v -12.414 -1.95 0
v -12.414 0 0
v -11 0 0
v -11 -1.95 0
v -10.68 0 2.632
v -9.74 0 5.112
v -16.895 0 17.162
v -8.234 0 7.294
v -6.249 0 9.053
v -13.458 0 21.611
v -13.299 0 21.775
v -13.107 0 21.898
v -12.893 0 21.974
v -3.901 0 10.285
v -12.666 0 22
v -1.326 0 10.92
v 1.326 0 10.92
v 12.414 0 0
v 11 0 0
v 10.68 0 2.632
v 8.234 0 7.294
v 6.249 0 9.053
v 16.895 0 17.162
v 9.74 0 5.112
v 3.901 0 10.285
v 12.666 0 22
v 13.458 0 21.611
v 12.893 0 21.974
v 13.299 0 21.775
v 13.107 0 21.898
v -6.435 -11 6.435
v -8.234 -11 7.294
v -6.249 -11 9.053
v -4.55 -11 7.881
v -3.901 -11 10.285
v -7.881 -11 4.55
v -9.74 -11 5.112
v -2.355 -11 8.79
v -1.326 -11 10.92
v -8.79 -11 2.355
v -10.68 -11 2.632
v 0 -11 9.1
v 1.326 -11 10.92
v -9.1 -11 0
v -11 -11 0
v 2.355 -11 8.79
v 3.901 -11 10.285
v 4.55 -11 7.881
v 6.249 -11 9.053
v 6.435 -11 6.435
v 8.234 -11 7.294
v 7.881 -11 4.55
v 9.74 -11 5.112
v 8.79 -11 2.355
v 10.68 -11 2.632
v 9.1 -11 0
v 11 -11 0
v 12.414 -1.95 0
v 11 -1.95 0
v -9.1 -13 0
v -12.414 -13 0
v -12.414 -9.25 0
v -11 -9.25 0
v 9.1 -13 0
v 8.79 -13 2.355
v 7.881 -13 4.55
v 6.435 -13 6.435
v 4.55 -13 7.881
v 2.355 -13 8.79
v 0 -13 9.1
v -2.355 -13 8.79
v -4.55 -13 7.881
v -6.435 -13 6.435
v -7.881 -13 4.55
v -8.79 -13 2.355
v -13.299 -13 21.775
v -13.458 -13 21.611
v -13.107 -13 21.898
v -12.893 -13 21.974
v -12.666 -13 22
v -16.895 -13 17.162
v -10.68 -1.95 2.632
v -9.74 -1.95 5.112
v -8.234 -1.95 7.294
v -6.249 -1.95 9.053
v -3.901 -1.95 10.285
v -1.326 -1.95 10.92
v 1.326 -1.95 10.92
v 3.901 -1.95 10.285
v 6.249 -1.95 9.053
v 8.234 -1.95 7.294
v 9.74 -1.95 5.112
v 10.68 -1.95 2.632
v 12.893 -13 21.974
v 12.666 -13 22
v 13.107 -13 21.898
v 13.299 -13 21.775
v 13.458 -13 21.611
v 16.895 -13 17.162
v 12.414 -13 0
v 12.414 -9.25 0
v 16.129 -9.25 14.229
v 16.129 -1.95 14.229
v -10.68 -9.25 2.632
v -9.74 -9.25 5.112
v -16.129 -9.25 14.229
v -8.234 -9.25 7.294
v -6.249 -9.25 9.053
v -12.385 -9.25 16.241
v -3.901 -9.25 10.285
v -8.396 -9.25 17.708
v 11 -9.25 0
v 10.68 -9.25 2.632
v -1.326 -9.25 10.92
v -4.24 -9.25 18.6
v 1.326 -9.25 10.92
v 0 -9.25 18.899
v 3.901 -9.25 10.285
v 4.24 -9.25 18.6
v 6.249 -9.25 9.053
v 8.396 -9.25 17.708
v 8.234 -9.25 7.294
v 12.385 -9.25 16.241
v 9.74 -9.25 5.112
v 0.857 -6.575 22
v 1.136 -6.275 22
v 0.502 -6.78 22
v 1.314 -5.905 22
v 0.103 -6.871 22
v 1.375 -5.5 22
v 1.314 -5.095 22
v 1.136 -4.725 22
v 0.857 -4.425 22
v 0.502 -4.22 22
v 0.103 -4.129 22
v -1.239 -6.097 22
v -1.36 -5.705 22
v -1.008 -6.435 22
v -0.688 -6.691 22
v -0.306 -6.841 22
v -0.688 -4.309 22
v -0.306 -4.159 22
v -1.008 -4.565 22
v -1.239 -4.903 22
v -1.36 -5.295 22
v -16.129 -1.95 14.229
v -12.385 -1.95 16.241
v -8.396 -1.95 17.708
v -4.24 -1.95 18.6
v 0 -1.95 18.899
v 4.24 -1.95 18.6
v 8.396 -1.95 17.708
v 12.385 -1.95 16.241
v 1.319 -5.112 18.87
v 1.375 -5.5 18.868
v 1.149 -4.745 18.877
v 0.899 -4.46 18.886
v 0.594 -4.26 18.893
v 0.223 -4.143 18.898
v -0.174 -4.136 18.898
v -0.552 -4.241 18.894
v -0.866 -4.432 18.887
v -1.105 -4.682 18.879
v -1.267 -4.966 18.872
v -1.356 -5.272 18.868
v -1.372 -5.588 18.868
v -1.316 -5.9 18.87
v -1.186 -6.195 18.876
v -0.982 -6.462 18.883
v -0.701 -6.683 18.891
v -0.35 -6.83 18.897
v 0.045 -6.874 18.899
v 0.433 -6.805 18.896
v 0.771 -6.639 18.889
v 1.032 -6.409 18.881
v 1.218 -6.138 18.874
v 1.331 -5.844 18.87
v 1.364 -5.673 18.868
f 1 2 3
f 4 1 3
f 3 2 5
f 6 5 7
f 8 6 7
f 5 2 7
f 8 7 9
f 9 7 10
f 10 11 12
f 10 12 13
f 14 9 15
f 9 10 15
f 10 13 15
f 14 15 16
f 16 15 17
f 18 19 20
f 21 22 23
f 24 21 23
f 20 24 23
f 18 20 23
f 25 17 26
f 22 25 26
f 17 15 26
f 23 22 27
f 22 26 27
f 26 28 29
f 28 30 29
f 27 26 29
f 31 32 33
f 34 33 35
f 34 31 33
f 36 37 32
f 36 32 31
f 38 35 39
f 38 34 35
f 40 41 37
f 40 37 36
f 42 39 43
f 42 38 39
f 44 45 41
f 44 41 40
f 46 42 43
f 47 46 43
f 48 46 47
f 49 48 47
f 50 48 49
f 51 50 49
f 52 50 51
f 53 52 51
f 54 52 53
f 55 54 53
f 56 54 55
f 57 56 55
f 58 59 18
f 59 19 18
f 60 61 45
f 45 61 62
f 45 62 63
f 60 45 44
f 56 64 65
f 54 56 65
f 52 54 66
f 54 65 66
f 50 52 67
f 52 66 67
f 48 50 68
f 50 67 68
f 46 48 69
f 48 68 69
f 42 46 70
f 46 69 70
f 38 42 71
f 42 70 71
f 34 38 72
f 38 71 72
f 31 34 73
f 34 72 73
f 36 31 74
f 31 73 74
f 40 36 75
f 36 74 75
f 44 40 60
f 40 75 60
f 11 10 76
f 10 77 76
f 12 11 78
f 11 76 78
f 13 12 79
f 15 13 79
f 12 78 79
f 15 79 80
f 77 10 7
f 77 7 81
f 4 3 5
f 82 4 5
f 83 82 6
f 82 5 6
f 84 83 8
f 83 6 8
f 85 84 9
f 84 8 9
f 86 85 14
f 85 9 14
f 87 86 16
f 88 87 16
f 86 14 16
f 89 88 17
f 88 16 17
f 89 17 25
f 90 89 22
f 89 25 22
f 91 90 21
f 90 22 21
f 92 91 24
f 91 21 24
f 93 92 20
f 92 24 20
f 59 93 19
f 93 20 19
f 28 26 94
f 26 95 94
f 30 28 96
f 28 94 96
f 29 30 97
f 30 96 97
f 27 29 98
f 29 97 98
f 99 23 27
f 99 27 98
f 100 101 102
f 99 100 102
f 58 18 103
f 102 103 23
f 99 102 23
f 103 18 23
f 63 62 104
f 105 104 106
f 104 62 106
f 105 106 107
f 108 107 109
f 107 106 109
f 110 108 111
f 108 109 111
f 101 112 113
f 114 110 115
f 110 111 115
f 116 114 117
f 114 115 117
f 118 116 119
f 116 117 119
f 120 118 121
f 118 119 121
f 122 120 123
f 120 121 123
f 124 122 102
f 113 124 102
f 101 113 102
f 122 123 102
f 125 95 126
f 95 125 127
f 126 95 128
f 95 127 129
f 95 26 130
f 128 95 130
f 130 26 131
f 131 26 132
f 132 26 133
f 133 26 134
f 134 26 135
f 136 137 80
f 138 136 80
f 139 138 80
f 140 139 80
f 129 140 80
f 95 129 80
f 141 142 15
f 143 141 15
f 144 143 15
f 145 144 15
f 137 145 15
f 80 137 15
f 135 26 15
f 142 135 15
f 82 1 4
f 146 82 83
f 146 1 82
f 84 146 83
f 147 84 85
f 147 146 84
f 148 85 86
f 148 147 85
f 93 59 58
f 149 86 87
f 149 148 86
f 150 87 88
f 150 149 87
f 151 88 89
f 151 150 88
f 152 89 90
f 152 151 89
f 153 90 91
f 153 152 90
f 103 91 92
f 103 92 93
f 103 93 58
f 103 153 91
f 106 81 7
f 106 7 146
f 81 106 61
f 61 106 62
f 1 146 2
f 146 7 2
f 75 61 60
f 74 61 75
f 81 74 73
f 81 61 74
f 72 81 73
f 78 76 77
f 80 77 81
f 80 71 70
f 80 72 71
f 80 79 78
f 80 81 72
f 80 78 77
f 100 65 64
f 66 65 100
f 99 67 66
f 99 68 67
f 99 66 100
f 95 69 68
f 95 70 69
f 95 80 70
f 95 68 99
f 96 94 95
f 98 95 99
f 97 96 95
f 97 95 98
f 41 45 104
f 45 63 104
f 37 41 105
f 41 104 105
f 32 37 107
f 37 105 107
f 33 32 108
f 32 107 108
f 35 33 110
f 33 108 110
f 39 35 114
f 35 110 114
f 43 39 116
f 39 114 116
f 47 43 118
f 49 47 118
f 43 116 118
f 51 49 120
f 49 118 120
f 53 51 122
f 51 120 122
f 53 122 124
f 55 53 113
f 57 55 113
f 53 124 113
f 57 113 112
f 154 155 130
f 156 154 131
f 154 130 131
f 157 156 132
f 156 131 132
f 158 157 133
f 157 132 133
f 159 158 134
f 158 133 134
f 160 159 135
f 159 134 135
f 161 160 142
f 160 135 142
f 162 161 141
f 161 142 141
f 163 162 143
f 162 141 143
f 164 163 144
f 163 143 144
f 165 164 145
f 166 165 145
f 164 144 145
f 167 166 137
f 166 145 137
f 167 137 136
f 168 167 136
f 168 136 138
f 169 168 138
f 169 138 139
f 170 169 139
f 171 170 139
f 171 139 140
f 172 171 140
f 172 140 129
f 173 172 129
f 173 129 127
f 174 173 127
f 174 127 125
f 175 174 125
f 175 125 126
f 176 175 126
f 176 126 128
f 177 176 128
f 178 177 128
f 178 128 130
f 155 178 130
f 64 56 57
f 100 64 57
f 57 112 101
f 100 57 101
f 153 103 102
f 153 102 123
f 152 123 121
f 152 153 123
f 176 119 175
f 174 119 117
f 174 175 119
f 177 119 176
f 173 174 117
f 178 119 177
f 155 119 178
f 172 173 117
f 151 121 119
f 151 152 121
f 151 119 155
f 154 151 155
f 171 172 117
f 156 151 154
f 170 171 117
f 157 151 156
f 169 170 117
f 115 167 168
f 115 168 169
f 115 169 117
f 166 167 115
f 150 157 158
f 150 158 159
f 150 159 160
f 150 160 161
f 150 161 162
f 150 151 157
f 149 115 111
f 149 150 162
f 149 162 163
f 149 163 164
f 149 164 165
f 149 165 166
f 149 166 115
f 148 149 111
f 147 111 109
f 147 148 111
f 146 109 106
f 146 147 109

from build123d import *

# Parameters (mm, degrees)
PAD040_DEPTH            = 7.3
BODY031_PLACEMENT_ANGLE = 90
PAD042_DEPTH            = 13
SKETCH139_R             = 11
POCKET086_DEPTH         = 11
SKETCH140_R             = 9.1
POCKET087_DEPTH         = 5
SKETCH141_R             = 1.375
POCKET088_DEPTH         = 5
CHAMFER021_SIZE         = 5
FILLET005_R             = 1


with BuildPart() as cortar_aleros:
    # Sketch132 → Pad040 (new body)
    with BuildSketch(Plane.XY):
        with BuildLine():
            ThreePointArc((30, -7.93752), (0, 18.8989421975), (-30, -7.93752))
            Line((-30, -7.93752), (30, -7.93752))
        make_face()
    extrude(amount=PAD040_DEPTH)


with BuildPart() as cortar_aleros_1:
    # Body031 placement: moved
    add(cortar_aleros.part.moved(Location((0, -1.95, 0))).rotate(Axis((0, -1.95, 0), (1, 0, 0)), BODY031_PLACEMENT_ANGLE))


with BuildPart() as grip_superior:
    # Sketch138 → Pad042 (new body)
    with BuildSketch(Plane.XZ):
        Polygon((-12.413768, 0), (12.413768, 0), (18.157619, 22), (-18.157619, 22), align=None)
    extrude(amount=PAD042_DEPTH)

    # Sketch139 (on Face5 of Pad042) → Pocket086 (cut)
    with BuildSketch(Plane(origin=(0, 0, 0), x_dir=(1, 0, 0), z_dir=(0, 1, 0))):
        Circle(SKETCH139_R)
    extrude(amount=-POCKET086_DEPTH, mode=Mode.SUBTRACT)

    # Sketch140 (on Face6 of Pocket086) → Pocket087 (cut)
    with BuildSketch(Plane.XZ.offset(13)):
        Circle(SKETCH140_R)
    extrude(amount=-POCKET087_DEPTH, mode=Mode.SUBTRACT)

    # Boolean: cut cortar aleros
    add(cortar_aleros_1.part, mode=Mode.SUBTRACT)

    # Sketch141 (on Face6 of Boolean) → Pocket088 (cut)
    with BuildSketch(Plane.XY.offset(22)):
        with Locations((0, -5.5)):
            Circle(SKETCH141_R)
    extrude(amount=-POCKET088_DEPTH, mode=Mode.SUBTRACT)

    # Chamfer021
    chamfer021_edges = [grip_superior.edges().sort_by_distance(p)[0] for p in [
        (-18.157619, -6.5, 22),
        (18.157619, -6.5, 22),
    ]]
    chamfer(chamfer021_edges, length=CHAMFER021_SIZE)

    # Fillet005
    fillet005_edges = [grip_superior.edges().sort_by_distance(p)[0] for p in [
        (-13.157619, -6.5, 22),
        (13.157619, -6.5, 22),
    ]]
    fillet(fillet005_edges, radius=FILLET005_R)


solid = grip_superior.part
